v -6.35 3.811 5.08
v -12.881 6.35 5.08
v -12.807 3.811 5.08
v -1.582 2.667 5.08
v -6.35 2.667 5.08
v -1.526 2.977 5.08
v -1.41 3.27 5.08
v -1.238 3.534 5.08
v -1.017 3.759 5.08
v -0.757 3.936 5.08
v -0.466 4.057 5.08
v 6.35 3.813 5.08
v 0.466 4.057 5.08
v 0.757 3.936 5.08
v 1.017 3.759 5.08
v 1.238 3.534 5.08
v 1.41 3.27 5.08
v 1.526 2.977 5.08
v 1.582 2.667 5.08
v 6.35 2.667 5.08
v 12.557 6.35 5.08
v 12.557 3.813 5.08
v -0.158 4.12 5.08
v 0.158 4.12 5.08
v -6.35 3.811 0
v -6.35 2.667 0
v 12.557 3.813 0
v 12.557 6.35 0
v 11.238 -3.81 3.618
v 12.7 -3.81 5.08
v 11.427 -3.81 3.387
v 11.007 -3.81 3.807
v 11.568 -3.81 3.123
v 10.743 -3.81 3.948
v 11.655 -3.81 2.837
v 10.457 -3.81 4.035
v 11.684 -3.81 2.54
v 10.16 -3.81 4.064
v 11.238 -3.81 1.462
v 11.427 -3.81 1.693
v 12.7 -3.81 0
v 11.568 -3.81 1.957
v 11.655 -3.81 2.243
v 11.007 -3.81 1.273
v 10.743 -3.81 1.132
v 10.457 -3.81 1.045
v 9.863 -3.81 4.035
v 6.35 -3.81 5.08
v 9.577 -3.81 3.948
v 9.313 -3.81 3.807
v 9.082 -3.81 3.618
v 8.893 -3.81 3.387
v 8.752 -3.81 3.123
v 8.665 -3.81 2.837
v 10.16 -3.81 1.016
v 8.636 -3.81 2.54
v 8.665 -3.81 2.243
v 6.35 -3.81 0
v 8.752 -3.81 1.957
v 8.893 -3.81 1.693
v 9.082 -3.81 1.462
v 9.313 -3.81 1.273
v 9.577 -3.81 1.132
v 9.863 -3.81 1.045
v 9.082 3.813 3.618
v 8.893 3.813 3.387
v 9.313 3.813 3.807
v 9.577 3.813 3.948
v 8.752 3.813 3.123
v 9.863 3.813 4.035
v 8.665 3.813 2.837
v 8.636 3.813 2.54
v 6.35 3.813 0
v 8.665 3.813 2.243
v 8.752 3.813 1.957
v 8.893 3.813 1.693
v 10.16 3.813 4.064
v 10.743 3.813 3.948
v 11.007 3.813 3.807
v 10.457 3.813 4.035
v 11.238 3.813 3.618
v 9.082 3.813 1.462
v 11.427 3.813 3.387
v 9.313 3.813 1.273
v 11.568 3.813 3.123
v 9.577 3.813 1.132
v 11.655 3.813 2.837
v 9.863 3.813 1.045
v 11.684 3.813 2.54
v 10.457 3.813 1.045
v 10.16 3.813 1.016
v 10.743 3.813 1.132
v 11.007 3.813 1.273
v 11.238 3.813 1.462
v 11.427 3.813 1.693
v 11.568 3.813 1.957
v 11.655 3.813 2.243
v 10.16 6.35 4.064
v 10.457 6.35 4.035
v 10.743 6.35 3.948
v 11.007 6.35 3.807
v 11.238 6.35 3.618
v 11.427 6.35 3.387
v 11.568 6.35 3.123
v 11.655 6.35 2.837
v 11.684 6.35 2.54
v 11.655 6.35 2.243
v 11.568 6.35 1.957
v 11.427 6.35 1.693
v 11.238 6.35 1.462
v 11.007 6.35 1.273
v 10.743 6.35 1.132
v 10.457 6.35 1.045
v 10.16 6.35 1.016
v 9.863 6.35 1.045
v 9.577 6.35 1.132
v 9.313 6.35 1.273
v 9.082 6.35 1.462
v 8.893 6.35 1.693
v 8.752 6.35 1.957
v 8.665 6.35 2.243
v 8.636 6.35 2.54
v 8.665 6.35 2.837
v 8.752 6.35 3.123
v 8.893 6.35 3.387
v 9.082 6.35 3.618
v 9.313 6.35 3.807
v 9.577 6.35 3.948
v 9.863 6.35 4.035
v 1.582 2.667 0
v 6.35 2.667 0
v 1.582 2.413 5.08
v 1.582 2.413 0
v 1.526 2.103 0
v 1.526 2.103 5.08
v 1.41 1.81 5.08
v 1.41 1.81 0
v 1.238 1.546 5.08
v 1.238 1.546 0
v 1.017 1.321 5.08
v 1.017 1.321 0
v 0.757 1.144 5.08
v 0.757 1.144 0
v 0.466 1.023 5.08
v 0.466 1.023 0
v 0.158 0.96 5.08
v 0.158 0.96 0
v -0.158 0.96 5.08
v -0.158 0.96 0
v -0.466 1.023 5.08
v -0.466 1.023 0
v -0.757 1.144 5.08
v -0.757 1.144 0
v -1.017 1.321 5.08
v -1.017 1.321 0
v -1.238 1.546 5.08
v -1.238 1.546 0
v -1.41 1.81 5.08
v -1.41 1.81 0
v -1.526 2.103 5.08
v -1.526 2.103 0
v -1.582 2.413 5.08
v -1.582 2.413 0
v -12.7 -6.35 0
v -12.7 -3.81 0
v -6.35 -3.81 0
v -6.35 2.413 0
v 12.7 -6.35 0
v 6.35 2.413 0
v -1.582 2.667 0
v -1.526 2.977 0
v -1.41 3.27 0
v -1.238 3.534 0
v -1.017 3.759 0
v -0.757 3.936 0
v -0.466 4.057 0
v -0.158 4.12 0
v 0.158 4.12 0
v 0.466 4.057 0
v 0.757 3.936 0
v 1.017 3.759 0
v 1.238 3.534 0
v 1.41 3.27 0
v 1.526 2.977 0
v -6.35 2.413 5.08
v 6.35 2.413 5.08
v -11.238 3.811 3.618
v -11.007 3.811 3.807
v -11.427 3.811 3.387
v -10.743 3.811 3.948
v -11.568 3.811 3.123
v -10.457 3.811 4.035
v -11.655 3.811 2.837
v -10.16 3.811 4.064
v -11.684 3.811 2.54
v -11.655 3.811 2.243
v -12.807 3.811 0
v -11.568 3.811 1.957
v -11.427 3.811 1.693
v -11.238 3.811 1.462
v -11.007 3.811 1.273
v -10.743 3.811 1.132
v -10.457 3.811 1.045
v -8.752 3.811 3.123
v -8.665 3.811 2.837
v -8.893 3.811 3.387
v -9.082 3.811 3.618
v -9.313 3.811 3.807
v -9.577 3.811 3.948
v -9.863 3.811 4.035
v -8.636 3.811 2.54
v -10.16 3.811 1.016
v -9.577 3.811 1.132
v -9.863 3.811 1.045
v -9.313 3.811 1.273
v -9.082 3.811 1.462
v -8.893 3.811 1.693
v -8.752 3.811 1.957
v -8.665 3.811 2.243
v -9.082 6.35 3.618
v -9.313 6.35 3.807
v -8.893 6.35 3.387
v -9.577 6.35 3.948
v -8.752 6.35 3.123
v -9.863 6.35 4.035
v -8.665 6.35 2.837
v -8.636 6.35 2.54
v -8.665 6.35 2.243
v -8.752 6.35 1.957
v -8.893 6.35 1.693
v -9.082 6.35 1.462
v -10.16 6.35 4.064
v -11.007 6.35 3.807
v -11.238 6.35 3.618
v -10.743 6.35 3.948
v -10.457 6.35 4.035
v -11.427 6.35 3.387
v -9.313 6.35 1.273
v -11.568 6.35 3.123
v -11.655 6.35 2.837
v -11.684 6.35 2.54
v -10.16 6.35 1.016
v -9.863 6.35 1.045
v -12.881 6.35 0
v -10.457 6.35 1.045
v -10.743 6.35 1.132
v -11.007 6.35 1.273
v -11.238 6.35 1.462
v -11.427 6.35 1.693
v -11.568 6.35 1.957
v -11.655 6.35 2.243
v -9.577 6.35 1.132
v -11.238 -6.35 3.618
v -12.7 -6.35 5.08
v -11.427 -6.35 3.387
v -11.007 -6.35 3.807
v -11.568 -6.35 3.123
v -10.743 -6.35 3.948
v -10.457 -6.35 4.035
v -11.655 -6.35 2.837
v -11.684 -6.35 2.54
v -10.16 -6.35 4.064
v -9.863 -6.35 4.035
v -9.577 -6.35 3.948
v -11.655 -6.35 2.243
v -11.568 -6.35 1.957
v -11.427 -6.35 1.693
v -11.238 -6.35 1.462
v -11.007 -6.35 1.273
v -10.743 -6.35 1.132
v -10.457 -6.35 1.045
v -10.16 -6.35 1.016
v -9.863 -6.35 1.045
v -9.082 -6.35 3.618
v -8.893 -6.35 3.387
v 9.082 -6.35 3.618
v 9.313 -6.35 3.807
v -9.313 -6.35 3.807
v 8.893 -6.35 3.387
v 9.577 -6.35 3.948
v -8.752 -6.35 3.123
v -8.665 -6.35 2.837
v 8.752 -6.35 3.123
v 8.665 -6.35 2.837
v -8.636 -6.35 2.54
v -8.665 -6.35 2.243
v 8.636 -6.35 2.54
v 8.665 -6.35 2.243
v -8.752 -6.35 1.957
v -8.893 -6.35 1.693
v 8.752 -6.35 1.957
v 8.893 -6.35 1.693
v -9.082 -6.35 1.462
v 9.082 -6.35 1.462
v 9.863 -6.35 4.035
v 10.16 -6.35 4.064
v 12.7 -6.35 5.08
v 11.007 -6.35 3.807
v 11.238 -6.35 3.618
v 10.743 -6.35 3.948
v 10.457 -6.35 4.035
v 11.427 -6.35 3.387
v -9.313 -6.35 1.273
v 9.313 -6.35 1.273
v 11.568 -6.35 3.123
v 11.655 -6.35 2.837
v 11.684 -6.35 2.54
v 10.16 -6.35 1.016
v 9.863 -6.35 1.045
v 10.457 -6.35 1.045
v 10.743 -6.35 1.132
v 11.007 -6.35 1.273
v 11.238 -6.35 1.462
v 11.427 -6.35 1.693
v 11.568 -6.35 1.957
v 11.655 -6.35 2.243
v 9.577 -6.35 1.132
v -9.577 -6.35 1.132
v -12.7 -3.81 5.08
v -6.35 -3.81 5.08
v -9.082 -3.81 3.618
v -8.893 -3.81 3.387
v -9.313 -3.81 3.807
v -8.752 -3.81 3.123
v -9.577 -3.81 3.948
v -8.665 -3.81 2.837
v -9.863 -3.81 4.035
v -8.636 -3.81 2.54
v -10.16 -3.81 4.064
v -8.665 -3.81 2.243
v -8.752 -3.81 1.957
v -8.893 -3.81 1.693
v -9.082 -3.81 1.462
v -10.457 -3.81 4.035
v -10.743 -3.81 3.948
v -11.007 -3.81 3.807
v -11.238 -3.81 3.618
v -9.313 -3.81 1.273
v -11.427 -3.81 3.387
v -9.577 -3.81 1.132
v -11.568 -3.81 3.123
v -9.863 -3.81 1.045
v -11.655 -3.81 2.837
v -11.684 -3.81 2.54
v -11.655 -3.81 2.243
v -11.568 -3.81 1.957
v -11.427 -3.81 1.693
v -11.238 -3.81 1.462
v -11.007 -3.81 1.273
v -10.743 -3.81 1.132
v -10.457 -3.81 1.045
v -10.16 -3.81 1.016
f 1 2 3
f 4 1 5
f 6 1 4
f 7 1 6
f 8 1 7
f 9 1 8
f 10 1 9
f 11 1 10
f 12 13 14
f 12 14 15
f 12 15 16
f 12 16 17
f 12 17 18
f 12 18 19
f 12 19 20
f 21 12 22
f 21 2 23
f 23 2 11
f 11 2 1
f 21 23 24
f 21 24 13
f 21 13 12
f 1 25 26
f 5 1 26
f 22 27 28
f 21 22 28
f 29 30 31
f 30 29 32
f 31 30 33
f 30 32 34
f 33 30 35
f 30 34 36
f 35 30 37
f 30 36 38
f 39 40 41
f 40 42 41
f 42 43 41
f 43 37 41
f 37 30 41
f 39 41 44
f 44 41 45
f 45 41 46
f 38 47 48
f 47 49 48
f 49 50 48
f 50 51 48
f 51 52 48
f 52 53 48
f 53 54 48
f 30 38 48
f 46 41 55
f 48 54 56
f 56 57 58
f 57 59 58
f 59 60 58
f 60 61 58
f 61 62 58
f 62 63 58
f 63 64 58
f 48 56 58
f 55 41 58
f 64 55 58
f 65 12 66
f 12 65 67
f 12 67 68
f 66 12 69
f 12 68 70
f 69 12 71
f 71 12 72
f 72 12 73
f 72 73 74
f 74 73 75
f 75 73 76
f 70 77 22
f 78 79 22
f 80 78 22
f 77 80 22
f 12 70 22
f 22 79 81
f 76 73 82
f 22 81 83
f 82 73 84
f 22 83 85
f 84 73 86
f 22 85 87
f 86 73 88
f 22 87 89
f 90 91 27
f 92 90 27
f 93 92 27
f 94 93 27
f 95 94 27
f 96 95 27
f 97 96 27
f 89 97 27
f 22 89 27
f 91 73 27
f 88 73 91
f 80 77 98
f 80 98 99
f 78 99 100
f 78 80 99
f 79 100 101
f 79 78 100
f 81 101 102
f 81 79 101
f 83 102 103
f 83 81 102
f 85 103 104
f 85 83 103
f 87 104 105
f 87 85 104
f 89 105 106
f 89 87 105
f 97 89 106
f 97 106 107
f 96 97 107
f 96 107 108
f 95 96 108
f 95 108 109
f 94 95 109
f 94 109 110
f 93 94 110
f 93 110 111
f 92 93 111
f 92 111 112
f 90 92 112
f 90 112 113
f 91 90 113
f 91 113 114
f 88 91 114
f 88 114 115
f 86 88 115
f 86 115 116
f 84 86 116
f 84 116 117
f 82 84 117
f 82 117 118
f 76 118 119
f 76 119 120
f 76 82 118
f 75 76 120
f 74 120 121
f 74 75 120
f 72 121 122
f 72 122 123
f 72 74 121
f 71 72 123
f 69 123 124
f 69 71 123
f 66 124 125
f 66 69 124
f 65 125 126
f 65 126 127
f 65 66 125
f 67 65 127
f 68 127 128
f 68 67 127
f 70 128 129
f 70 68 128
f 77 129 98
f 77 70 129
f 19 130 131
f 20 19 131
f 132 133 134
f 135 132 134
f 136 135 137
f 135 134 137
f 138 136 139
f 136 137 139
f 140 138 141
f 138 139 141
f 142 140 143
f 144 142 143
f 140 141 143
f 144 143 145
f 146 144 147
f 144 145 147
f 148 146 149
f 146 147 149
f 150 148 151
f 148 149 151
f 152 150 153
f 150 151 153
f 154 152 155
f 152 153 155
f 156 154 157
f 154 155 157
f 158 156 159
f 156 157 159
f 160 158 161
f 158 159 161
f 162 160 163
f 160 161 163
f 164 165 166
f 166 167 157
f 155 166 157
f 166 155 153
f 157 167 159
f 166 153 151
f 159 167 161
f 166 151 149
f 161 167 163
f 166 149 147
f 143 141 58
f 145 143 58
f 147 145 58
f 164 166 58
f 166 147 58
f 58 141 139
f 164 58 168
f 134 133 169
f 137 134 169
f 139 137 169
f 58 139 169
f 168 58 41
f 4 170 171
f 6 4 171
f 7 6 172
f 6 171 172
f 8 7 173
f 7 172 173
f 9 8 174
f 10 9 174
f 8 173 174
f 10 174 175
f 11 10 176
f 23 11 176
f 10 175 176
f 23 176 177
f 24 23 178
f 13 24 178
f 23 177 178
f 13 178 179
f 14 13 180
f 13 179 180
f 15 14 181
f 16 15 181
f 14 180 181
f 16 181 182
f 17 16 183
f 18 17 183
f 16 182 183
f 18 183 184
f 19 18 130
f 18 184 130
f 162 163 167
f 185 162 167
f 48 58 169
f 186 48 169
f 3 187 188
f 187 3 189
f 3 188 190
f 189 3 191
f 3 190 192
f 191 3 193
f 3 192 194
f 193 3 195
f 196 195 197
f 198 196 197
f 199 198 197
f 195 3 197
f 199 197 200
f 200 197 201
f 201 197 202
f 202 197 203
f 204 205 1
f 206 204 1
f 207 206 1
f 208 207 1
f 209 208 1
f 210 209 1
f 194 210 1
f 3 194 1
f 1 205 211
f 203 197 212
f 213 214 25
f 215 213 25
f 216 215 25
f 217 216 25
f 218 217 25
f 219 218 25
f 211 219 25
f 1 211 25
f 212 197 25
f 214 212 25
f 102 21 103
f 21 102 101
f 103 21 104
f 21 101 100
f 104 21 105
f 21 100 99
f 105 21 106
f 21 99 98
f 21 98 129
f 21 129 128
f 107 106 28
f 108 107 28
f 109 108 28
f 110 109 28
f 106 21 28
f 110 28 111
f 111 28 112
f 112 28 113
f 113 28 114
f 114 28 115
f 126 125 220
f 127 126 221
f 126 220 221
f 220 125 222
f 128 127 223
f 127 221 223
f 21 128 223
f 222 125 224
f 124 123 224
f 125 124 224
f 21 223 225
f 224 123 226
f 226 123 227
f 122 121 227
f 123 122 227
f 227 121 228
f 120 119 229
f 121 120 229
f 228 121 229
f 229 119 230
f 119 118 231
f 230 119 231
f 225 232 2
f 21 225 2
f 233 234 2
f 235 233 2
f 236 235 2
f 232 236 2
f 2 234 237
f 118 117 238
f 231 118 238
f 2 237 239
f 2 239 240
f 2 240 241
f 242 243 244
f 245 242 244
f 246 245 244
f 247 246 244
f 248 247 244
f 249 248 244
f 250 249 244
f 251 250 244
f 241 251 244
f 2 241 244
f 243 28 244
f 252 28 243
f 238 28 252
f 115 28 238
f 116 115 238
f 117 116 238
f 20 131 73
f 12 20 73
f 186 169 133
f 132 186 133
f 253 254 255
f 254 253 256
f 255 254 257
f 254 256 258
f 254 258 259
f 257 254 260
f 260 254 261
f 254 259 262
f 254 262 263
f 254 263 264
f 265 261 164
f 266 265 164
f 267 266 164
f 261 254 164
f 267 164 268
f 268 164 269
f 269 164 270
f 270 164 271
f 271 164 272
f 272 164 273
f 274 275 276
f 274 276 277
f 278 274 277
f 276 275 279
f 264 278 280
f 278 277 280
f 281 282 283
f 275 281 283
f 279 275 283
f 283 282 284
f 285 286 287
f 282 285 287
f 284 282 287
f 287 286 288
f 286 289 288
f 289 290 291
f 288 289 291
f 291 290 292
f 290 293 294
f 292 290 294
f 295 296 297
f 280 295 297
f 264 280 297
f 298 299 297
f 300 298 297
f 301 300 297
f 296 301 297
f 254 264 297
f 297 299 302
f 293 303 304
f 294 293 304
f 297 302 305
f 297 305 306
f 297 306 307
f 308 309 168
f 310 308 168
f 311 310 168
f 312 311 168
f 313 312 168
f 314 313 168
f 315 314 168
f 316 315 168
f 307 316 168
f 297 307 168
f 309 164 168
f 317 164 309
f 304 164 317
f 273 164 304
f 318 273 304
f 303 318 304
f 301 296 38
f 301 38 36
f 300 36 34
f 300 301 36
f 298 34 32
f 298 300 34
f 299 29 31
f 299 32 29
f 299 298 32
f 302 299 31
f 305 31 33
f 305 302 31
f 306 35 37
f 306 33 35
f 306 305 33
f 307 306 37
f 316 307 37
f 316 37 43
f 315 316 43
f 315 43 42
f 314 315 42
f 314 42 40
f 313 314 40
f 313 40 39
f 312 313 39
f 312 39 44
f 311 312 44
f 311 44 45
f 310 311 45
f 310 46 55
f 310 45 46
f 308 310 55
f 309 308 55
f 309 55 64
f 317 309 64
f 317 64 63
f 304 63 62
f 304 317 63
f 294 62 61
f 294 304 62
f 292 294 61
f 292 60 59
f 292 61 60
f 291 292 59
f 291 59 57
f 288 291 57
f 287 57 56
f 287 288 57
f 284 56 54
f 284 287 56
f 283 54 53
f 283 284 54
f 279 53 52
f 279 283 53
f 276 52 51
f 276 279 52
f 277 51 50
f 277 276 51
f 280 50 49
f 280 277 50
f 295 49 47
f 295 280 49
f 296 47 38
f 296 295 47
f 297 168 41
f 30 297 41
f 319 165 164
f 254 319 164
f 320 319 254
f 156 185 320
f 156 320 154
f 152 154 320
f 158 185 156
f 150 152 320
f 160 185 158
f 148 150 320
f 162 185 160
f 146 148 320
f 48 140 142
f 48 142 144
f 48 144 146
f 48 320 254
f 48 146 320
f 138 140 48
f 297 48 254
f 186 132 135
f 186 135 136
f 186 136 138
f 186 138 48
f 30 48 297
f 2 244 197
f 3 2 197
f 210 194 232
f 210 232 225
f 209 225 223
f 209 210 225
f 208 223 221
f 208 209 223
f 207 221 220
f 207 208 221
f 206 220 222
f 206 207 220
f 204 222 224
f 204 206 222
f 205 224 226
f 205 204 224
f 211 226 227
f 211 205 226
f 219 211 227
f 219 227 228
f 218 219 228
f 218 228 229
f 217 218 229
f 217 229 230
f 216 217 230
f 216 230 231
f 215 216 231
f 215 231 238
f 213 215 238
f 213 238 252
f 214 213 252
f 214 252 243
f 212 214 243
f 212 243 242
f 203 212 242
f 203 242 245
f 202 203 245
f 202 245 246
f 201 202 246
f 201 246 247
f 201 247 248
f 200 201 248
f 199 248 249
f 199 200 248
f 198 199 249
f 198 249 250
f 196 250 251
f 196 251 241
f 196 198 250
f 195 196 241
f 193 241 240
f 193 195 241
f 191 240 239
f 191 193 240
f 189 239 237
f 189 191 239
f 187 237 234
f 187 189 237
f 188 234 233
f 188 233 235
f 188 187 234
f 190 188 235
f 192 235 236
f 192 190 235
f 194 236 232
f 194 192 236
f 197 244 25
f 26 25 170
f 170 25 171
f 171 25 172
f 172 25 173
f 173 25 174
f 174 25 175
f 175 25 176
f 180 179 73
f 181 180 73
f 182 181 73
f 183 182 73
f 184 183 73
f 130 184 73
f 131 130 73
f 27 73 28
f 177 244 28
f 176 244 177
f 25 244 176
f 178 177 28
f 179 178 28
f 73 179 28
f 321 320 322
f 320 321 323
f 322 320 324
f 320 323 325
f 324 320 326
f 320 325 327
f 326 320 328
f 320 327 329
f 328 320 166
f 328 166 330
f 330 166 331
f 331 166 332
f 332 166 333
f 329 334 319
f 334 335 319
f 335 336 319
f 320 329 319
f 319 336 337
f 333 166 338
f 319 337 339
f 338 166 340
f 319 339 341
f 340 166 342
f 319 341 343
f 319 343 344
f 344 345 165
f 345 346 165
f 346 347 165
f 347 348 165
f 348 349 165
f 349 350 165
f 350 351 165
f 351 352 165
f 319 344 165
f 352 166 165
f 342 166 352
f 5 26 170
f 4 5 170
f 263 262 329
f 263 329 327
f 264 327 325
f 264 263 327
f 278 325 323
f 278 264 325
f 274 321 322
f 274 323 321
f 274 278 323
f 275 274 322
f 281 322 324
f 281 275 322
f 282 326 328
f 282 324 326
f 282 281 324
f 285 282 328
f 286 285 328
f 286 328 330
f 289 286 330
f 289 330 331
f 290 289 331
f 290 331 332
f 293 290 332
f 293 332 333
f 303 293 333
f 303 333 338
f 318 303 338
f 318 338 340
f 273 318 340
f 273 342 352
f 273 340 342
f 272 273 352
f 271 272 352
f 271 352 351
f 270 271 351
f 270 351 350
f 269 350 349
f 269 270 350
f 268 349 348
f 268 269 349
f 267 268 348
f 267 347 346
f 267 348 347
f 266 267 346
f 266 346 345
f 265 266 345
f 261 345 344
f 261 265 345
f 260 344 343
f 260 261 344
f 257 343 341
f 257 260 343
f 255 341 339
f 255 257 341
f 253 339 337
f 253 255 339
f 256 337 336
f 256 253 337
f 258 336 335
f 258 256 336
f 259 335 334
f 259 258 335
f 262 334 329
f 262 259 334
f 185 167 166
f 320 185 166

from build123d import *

# Parameters (mm, degrees)
BOSS_EXTRUDE1_DEPTH     = 5.08
BOSS_EXTRUDE1_2_DEPTH   = 5.08
CUT_EXTRUDE1_DEPTH      = 24.986
CUT_EXTRUDE1_DEPTH_BACK = 19.788527723
SKETCH4_R               = 1.524
CUT_EXTRUDE3_START      = -2.54
SKETCH8_R               = 1.524
CUT_EXTRUDE3_DEPTH      = 2.54


with BuildPart() as part:
    # Sketch2 → Boss-Extrude1 (new body)
    with BuildSketch(Plane.XY):
        with BuildLine():
            Line((-12.7, -6.35), (12.7, -6.35))
            Line((12.7, -6.35), (12.7, -3.81))
            Line((12.7, -3.81), (6.35, -3.81))
            Line((6.35, -3.81), (6.35, 0))
            Line((6.35, 0), (6.35, 2.413))
            Line((6.35, 2.413), (1.582411846, 2.413))
            ThreePointArc((1.582411846, 2.413), (0, 0.9525), (-1.582411846, 2.413))
            Line((-1.582411846, 2.413), (-6.35, 2.413))
            Line((-6.35, 2.413), (-6.35, 0))
            Line((-6.35, 0), (-6.35, -3.81))
            Line((-6.35, -3.81), (-12.7, -3.81))
            Line((-12.7, -3.81), (-12.7, -6.35))
        make_face()
    extrude(amount=BOSS_EXTRUDE1_DEPTH)

    # Sketch4 → Cut-Extrude1 (cut, two sides: drawn at the far end of the back side and taken through both)
    with BuildSketch(Plane(origin=(0, -6.35, 0), x_dir=(1, 0, 0), z_dir=(0, 1, 0)).offset(-CUT_EXTRUDE1_DEPTH_BACK)):
        with Locations(Location((-10.16, -2.54, 0), (0, 0, 270))):
            Circle(SKETCH4_R)
        with Locations(Location((10.16, -2.54, 0), (0, 0, 270))):
            Circle(SKETCH4_R)
    extrude(amount=CUT_EXTRUDE1_DEPTH + CUT_EXTRUDE1_DEPTH_BACK, mode=Mode.SUBTRACT)


with BuildPart() as body_2:
    # Sketch2 → Boss-Extrude1 2 (new body)
    with BuildSketch(Plane.XY):
        with BuildLine():
            Line((-12.806936218, 3.811499228), (-6.35, 3.811499228))
            Line((-6.35, 3.811499228), (-6.35, 2.667))
            Line((-6.35, 2.667), (-1.582411846, 2.667))
            ThreePointArc((-1.582411846, 2.667), (0, 4.1275), (1.582411846, 2.667))
            Line((1.582411846, 2.667), (6.35, 2.667))
            Line((6.35, 2.667), (6.35, 3.812680478))
            Line((6.35, 3.812680478), (12.557057806, 3.812680478))
            Line((12.557057806, 3.812680478), (12.557057806, 6.35))
            Line((12.557057806, 6.35), (-12.88069773, 6.35))
            Line((-12.88069773, 6.35), (-12.806936218, 3.811499228))
        make_face()
    extrude(amount=BOSS_EXTRUDE1_2_DEPTH)

    # Sketch8 → Cut-Extrude3 (cut)
    with BuildSketch(Plane(origin=(0, 6.35, 0), x_dir=(1, 0, 0), z_dir=(0, 1, 0)).offset(CUT_EXTRUDE3_START)):
        with Locations(Location((10.16, -2.54, 0), (0, 0, 270))):
            Circle(SKETCH8_R)
        with Locations(Location((-10.16, -2.54, 0), (0, 0, 270))):
            Circle(SKETCH8_R)
    extrude(amount=CUT_EXTRUDE3_DEPTH, mode=Mode.SUBTRACT)


solid = Compound([part.part, body_2.part])
